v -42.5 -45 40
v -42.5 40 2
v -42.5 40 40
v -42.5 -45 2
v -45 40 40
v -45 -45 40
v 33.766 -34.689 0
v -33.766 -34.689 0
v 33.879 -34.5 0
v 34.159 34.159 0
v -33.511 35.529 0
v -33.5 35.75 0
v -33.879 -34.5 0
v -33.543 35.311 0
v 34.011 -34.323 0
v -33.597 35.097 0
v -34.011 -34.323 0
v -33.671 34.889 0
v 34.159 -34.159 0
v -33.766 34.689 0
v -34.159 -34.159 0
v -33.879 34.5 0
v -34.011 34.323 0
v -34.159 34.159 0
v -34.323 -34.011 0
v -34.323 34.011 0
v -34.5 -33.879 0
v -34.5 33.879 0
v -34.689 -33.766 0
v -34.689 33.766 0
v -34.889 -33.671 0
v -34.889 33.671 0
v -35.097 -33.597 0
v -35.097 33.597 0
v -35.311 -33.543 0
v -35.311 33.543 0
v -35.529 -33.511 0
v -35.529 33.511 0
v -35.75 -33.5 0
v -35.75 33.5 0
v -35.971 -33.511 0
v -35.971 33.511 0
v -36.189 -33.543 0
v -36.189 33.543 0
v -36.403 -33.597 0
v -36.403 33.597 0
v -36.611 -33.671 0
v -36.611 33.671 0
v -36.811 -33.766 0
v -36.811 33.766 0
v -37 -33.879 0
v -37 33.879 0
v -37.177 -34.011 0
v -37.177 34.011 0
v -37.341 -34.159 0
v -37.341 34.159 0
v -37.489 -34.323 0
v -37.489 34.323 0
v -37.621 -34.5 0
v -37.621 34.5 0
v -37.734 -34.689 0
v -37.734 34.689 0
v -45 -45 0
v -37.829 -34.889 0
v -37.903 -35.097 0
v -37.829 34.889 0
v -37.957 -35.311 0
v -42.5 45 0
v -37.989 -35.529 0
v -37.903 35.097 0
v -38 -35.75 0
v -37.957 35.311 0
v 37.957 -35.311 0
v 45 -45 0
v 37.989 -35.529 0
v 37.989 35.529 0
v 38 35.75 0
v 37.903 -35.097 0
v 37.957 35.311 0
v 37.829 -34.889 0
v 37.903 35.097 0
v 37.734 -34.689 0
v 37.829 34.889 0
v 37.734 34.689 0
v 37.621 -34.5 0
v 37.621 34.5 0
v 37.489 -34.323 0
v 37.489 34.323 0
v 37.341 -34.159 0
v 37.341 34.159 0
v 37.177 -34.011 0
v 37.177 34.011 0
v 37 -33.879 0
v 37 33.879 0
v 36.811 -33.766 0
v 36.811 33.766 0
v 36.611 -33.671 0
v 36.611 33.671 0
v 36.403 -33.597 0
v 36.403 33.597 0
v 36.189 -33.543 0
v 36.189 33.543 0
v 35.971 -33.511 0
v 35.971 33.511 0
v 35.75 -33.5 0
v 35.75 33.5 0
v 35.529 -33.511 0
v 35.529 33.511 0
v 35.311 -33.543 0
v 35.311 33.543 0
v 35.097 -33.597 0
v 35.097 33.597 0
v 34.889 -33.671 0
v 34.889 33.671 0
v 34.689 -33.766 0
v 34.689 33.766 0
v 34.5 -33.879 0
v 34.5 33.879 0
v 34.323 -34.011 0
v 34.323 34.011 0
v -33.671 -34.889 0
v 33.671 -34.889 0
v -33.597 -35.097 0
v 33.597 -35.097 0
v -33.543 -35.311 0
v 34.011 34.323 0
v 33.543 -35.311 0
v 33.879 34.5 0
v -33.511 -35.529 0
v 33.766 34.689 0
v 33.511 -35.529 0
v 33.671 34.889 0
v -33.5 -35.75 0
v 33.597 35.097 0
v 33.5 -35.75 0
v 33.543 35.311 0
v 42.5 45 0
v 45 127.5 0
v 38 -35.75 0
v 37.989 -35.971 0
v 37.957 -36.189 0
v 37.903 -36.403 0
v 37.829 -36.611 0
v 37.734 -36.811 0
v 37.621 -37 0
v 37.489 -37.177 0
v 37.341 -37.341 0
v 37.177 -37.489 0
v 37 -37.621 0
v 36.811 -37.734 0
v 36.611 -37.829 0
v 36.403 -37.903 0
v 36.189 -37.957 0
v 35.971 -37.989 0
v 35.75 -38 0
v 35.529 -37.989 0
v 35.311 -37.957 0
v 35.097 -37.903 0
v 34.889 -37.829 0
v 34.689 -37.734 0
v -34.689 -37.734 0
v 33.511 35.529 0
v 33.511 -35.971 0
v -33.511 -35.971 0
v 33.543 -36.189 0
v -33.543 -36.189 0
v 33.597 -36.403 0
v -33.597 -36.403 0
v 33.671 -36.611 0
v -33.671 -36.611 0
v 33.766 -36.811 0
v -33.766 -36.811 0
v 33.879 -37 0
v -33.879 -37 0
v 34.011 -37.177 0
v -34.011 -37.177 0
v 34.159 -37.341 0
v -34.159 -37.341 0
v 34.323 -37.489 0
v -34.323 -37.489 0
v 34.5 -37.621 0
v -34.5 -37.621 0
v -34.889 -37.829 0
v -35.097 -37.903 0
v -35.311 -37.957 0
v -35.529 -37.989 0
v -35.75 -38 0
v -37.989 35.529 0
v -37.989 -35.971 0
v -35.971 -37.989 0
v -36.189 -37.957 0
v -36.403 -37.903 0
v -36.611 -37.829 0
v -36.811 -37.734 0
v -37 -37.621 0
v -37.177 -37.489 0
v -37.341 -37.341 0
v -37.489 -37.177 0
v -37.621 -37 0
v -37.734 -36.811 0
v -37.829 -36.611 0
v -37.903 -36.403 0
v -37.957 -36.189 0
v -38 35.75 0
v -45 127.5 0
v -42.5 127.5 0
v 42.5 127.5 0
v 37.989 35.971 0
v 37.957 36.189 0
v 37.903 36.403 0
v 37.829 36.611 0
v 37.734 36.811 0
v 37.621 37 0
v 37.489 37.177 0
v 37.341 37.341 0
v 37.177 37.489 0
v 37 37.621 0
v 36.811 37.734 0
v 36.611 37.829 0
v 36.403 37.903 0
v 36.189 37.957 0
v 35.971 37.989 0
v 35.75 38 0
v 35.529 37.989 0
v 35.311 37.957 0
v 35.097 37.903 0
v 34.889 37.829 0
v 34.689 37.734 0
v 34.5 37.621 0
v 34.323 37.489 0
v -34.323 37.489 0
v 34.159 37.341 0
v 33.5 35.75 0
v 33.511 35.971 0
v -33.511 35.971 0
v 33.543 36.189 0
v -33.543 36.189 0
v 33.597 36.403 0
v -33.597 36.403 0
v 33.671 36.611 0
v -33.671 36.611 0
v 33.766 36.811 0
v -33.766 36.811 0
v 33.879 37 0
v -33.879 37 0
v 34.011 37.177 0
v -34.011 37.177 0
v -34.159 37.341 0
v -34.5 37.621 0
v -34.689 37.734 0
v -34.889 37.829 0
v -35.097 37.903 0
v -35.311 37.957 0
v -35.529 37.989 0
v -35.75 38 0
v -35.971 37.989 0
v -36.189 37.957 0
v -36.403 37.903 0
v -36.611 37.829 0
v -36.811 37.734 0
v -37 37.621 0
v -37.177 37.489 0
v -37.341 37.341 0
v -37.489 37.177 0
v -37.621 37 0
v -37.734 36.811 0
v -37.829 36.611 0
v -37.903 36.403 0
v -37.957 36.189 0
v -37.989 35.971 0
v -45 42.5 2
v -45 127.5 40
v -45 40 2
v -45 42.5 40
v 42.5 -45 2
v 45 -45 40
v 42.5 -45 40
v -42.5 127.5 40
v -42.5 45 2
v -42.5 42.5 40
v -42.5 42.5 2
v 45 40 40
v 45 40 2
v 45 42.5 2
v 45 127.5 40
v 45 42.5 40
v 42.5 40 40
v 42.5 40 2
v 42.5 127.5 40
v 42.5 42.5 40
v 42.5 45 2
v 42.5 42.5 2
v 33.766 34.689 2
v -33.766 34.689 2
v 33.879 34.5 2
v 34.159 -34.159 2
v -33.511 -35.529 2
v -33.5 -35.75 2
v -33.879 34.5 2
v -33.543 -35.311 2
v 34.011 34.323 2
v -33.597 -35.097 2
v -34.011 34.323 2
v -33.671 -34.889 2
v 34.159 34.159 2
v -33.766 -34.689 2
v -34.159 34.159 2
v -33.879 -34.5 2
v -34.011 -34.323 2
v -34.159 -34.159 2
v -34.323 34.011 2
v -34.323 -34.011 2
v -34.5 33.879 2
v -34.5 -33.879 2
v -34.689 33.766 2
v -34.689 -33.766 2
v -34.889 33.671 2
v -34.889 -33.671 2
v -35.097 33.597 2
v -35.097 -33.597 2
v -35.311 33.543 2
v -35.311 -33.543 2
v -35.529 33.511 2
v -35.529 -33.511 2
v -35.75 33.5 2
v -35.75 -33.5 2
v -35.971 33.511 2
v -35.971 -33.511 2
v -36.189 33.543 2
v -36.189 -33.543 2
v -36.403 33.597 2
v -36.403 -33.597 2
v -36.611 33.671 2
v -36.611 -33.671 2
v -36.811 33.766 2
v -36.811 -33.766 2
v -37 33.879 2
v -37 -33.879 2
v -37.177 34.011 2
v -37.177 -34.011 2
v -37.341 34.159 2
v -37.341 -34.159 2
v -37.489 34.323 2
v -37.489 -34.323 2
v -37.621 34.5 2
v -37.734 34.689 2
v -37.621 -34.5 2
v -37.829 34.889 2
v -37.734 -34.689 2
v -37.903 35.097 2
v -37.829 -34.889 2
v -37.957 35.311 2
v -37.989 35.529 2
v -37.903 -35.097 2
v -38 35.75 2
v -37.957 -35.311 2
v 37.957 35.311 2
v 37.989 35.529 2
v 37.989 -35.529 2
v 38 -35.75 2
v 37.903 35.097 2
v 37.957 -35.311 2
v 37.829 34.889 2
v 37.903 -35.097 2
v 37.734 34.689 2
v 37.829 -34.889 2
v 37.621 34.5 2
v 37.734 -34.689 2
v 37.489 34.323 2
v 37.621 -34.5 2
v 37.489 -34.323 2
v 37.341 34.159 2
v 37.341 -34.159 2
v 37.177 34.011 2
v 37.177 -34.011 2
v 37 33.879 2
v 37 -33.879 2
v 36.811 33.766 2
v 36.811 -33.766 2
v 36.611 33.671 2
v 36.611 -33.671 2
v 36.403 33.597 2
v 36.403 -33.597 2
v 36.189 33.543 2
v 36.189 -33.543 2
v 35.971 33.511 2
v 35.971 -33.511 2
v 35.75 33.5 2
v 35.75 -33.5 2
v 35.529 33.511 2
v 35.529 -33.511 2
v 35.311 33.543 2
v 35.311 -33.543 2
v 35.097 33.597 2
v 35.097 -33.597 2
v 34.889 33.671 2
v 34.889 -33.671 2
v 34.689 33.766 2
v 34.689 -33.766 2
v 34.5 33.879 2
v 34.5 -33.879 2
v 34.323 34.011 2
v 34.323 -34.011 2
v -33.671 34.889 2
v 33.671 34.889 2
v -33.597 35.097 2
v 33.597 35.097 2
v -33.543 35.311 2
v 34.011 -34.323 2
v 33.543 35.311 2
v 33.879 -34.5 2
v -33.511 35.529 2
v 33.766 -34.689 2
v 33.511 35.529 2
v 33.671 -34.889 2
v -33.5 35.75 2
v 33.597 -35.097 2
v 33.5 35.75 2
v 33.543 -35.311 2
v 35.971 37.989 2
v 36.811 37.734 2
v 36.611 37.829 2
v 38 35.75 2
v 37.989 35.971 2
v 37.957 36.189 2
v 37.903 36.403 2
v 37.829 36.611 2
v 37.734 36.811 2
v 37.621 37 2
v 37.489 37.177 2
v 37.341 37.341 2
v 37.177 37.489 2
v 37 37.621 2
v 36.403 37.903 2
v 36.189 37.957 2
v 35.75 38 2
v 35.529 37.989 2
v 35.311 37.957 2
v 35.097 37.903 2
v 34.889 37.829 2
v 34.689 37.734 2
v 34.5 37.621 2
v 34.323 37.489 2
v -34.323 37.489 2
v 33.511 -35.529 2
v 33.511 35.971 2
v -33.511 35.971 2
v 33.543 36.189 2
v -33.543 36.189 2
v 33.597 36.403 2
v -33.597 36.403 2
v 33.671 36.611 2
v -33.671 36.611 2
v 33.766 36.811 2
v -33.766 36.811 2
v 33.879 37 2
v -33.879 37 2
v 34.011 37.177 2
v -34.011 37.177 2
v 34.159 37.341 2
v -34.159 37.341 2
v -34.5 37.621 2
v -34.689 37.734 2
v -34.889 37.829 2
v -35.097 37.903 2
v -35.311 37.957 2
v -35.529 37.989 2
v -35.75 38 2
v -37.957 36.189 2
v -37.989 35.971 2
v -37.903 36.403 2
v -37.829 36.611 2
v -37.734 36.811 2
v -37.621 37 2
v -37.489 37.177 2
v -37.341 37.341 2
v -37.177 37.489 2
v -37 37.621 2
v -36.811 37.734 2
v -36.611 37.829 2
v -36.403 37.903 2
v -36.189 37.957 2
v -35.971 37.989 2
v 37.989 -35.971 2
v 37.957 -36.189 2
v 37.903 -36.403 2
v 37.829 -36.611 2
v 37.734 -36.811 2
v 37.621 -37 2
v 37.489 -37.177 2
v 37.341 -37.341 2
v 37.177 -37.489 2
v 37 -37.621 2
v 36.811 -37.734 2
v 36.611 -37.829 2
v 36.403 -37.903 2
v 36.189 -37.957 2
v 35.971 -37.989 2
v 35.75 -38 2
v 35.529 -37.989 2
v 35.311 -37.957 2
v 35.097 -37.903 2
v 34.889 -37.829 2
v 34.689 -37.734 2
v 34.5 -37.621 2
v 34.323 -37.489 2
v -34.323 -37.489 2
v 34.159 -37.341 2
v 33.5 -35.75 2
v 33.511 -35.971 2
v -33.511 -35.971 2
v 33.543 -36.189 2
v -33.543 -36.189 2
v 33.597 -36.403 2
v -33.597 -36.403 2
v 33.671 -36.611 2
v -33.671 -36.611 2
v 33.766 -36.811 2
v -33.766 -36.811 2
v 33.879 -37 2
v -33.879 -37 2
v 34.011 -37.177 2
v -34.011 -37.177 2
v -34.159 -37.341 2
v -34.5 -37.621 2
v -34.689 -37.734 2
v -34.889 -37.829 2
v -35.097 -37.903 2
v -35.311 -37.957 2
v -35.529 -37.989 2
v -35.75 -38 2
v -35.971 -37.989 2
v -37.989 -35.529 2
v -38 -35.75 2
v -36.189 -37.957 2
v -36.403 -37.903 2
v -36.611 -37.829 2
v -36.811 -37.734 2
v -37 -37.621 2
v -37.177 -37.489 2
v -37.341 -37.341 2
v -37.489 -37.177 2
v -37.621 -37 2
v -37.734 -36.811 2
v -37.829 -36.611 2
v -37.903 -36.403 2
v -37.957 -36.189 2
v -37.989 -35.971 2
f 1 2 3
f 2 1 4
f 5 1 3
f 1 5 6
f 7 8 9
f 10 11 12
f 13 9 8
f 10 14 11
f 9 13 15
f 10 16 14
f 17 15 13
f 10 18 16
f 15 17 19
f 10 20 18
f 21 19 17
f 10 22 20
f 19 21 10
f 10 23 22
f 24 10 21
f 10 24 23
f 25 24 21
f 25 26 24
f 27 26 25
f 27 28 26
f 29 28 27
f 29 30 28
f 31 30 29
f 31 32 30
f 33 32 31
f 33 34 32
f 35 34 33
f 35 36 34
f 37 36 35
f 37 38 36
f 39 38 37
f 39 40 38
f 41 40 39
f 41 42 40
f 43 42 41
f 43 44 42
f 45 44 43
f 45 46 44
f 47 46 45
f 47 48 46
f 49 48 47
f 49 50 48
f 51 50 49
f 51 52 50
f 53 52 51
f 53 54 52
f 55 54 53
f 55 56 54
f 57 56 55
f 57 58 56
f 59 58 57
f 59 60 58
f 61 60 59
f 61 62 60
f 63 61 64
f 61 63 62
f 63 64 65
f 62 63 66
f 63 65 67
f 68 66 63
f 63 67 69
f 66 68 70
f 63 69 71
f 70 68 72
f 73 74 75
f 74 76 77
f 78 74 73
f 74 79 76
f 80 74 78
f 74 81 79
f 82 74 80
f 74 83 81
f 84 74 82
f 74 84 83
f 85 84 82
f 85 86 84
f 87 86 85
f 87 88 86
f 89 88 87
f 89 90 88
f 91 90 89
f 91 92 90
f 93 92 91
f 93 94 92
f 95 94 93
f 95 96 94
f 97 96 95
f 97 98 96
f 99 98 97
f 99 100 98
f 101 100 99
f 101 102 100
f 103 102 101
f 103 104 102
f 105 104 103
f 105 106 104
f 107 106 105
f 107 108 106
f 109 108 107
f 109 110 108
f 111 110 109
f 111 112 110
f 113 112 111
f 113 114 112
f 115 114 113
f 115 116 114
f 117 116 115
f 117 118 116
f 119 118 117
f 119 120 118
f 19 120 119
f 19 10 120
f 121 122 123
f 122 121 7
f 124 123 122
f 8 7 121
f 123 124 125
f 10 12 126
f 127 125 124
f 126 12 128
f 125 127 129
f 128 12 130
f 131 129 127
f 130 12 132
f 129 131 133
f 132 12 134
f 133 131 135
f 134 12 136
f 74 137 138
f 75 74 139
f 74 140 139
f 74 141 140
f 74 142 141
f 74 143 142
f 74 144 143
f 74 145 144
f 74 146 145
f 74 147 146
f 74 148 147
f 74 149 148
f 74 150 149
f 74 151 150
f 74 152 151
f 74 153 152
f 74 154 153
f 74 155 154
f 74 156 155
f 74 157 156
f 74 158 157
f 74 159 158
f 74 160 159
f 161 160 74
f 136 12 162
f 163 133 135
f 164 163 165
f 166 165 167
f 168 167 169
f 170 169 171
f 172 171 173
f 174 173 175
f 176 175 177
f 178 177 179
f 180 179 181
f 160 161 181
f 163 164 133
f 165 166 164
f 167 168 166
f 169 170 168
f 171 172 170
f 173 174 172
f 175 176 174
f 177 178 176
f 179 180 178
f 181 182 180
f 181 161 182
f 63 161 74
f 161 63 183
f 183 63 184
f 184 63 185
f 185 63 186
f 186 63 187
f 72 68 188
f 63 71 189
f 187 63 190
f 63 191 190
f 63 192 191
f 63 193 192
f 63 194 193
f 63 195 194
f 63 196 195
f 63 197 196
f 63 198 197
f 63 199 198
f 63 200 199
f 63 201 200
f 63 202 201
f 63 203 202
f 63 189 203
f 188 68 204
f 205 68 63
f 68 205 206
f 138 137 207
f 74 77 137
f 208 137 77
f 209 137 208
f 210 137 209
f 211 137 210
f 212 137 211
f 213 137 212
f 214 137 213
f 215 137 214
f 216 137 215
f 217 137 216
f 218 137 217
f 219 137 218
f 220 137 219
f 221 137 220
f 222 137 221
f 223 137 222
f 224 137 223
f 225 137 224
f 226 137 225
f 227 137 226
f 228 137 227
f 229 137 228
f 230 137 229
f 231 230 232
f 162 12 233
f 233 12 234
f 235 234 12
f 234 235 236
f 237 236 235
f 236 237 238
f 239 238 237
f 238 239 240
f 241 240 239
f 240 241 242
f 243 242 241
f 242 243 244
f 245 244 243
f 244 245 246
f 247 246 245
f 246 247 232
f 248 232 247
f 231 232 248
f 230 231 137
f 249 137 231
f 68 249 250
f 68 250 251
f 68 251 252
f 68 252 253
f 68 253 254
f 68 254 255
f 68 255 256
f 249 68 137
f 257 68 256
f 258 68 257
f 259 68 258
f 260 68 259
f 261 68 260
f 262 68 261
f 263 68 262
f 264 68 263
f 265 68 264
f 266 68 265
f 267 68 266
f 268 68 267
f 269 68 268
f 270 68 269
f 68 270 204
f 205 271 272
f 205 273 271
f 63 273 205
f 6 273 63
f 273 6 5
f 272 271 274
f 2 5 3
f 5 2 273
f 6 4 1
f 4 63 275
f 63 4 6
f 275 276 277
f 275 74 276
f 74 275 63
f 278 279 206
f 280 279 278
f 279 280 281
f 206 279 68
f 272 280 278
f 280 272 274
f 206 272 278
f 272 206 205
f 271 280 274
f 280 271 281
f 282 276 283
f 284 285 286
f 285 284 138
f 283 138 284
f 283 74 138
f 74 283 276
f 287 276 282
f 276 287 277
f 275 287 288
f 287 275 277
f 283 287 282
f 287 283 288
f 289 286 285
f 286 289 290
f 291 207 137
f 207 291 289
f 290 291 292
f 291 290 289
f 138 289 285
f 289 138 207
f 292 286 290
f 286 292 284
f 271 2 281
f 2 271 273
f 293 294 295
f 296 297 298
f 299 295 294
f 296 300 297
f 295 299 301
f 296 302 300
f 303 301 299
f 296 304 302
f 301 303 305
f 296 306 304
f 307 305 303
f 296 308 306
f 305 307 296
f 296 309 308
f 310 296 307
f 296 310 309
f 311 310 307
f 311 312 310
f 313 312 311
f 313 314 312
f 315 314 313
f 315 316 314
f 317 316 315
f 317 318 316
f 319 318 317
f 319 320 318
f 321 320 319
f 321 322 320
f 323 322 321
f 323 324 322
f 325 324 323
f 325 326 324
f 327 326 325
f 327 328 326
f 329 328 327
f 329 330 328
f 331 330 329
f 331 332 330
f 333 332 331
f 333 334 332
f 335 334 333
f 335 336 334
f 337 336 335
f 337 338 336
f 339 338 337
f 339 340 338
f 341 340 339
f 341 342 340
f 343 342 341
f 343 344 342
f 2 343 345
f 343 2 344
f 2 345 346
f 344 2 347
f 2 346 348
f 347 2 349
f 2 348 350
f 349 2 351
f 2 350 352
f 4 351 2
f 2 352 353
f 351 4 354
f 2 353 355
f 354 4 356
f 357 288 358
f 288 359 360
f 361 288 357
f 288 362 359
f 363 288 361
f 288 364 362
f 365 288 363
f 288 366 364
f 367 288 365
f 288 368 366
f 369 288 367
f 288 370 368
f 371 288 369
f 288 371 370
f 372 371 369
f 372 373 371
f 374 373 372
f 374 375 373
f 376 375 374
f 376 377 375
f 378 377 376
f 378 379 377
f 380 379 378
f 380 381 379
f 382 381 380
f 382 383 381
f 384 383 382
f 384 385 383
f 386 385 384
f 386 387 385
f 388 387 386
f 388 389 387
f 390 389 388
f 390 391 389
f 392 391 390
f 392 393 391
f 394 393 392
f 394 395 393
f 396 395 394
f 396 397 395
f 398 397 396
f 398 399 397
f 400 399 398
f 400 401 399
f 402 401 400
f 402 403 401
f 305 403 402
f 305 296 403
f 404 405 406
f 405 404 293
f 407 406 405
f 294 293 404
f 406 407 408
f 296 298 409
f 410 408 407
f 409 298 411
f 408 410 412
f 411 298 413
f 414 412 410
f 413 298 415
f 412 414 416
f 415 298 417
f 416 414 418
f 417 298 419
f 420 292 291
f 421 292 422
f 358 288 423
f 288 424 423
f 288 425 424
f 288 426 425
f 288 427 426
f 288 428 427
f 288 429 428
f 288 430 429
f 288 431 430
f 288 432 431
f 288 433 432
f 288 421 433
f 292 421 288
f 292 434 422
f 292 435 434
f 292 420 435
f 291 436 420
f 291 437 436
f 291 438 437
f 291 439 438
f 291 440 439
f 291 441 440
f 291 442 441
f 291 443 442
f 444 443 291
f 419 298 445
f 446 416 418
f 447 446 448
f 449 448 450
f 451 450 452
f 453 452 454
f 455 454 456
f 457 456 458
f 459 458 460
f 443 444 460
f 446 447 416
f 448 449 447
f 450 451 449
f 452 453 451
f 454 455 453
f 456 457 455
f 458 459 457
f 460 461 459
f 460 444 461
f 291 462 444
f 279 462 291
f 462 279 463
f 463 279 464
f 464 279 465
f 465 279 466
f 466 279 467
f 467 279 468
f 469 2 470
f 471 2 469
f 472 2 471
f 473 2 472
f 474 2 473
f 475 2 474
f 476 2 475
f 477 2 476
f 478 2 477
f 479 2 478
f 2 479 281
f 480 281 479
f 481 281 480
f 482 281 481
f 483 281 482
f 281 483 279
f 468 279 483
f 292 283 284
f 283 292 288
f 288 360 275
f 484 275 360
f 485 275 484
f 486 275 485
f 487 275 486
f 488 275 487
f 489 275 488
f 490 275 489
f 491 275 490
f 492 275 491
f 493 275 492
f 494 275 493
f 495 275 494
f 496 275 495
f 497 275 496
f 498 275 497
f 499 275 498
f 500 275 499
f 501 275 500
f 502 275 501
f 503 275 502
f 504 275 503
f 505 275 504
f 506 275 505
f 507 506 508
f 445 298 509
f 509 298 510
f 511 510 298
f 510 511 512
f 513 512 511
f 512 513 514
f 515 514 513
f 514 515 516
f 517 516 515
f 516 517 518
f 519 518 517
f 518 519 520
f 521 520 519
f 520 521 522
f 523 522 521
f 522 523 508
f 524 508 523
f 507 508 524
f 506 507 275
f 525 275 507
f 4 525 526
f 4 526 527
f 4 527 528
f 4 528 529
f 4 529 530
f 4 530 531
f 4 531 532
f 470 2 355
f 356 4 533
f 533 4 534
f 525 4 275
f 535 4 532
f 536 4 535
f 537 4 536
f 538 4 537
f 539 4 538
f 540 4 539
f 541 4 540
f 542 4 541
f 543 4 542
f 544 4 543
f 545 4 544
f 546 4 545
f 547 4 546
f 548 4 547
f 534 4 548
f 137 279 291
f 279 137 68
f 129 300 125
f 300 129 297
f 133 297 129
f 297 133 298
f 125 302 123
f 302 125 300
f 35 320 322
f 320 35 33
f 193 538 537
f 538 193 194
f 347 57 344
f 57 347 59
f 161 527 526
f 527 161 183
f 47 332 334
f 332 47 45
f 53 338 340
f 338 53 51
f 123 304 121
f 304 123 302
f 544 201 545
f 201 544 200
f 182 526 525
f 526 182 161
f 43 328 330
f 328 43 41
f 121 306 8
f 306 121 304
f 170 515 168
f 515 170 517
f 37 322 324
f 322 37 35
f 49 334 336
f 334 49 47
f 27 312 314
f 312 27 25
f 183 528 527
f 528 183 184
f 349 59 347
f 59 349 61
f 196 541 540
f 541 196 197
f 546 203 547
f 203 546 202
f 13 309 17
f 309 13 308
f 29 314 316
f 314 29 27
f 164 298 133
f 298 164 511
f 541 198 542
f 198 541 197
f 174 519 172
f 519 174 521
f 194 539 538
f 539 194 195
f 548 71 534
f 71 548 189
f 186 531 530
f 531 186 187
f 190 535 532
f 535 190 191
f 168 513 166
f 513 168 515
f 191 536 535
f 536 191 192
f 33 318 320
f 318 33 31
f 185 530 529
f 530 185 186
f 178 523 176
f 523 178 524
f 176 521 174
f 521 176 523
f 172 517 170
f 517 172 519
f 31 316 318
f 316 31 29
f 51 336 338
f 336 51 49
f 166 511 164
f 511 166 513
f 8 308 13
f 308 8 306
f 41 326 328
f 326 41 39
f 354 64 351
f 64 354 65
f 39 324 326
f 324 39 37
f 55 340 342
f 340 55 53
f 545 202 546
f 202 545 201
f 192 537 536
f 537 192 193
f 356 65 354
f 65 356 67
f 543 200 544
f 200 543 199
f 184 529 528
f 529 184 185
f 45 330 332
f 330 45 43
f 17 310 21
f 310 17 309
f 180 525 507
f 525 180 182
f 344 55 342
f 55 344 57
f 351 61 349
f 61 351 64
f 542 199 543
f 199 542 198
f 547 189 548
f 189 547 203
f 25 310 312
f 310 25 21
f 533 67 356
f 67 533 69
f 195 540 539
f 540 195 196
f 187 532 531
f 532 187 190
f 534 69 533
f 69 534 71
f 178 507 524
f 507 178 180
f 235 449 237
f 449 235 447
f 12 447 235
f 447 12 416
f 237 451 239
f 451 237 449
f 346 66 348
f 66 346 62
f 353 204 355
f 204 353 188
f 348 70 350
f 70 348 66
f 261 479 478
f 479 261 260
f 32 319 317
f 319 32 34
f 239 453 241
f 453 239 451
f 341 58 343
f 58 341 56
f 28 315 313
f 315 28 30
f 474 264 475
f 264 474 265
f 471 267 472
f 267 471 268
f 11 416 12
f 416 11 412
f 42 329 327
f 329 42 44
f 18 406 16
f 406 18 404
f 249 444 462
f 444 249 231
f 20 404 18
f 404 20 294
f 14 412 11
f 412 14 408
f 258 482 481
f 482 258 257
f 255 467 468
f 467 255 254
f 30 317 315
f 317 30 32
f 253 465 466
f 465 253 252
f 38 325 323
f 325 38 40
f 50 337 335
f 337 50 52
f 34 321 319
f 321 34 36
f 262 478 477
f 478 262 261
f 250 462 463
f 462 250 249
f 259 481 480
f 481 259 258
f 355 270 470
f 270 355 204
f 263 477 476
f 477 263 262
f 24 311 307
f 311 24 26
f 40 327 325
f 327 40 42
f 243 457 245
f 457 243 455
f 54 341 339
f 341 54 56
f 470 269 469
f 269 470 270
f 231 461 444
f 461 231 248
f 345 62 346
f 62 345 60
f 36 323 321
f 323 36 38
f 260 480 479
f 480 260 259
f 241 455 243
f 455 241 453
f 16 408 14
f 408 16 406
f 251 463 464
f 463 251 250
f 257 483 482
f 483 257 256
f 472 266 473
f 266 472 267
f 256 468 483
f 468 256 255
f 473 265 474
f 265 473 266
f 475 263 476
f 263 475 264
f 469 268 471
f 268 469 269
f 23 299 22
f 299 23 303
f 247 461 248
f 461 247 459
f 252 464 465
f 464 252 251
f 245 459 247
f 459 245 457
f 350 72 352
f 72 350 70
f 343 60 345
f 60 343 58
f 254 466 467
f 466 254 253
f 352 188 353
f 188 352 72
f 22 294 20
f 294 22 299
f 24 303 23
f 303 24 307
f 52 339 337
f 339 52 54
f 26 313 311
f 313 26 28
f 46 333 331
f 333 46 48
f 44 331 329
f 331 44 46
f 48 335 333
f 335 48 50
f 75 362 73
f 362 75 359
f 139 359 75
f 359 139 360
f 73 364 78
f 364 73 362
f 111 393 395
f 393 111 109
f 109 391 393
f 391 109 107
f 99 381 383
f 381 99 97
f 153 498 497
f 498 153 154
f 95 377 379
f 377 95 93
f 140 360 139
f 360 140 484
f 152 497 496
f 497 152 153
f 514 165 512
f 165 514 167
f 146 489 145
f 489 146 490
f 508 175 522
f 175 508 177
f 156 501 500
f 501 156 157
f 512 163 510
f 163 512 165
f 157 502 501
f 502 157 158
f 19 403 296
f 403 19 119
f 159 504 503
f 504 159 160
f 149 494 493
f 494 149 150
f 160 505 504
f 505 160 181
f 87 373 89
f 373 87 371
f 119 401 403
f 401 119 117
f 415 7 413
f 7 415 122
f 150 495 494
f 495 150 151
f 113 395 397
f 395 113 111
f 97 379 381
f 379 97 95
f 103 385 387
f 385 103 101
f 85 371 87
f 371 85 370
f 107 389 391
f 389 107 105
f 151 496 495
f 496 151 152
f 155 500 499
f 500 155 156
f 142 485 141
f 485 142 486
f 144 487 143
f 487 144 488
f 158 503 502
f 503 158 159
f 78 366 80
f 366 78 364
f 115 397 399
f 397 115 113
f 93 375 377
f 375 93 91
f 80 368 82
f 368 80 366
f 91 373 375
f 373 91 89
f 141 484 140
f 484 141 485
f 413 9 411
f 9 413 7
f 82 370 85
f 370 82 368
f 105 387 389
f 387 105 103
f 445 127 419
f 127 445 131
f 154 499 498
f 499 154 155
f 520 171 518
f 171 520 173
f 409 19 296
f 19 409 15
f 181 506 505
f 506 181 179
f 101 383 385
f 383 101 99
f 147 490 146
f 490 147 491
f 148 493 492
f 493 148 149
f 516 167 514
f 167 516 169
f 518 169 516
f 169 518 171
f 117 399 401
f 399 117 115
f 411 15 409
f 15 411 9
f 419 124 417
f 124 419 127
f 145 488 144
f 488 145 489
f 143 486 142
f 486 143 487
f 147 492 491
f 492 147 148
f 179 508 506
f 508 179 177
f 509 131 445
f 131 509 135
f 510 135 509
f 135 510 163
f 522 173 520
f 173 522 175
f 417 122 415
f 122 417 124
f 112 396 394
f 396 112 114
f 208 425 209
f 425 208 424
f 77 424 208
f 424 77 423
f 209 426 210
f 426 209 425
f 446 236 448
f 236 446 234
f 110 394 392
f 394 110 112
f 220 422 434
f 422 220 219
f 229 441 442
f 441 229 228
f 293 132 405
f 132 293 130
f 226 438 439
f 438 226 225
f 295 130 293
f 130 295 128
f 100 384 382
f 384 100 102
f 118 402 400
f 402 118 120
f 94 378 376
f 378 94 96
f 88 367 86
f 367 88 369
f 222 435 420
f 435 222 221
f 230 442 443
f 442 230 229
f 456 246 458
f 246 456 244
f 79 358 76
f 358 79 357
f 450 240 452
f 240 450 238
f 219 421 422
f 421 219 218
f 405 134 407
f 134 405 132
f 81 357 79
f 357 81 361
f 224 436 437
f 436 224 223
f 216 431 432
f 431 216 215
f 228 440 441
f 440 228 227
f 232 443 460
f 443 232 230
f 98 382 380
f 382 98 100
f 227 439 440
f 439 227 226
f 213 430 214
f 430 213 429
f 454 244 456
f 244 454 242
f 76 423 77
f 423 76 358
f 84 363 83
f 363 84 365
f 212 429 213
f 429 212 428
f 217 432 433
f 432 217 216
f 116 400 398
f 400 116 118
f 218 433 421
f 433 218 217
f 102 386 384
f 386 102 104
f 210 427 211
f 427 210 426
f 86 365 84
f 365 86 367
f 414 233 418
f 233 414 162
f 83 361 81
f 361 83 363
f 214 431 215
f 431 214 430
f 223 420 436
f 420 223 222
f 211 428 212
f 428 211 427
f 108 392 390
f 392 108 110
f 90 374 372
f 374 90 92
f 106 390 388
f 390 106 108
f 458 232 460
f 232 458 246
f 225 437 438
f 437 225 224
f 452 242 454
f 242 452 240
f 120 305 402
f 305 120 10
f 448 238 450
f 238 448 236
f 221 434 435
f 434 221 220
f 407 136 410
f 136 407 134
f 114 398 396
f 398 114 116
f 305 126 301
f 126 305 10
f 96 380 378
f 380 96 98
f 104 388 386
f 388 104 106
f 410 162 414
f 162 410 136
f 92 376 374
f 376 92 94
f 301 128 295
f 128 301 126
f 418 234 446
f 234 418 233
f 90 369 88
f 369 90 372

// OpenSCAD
// Magnetic stirrer housing for 80 mm PC case fan
// Print orientation: top plate on bed (z = 0), walls build upward (+Z)

// ---------- Dimensions ----------
plate_t      = 2;     // top plate thickness
wall_t       = 2.5;   // wall thickness
box_h        = 40;    // outer wall height (open top)
outer_x      = 90;    // outer size in X
outer_y      = 90;    // outer size in Y
hole_d       = 4.5;   // M4 screw hole diameter
hole_pitch   = 71.5;  // screw hole square pattern side
notch_w      = 12;    // cable notch width
notch_depth  = 8;     // cable notch depth from open edge
eps          = 0.5;   // cutter overshoot

$fn = 64;

// ---------- Model ----------
difference() {
    union() {
        // Top plate
        translate([-outer_x/2, -outer_y/2, 0])
            cube([outer_x, outer_y, plate_t]);

        // Four walls rising to z = box_h
        for (sx = [-1, 1], sy = [-1, 1])
            translate([sx > 0 ? outer_x/2 - wall_t : -outer_x/2,
                       sy > 0 ? outer_y/2 - wall_t : -outer_y/2,
                       0])
                cube([wall_t, outer_y - 2*wall_t, box_h]);
    }

    // Screw holes through top plate
    for (x = [-hole_pitch/2, hole_pitch/2])
        for (y = [-hole_pitch/2, hole_pitch/2])
            translate([x, y, -eps])
                cylinder(d = hole_d, h = plate_t + 2*eps);

    // Cable notch in one wall (along +X wall, centred)
    translate([(outer_x/2 - wall_t)/2, -outer_y/2, box_h - notch_depth])
        cube([notch_w, outer_y, notch_depth + eps]);
}
